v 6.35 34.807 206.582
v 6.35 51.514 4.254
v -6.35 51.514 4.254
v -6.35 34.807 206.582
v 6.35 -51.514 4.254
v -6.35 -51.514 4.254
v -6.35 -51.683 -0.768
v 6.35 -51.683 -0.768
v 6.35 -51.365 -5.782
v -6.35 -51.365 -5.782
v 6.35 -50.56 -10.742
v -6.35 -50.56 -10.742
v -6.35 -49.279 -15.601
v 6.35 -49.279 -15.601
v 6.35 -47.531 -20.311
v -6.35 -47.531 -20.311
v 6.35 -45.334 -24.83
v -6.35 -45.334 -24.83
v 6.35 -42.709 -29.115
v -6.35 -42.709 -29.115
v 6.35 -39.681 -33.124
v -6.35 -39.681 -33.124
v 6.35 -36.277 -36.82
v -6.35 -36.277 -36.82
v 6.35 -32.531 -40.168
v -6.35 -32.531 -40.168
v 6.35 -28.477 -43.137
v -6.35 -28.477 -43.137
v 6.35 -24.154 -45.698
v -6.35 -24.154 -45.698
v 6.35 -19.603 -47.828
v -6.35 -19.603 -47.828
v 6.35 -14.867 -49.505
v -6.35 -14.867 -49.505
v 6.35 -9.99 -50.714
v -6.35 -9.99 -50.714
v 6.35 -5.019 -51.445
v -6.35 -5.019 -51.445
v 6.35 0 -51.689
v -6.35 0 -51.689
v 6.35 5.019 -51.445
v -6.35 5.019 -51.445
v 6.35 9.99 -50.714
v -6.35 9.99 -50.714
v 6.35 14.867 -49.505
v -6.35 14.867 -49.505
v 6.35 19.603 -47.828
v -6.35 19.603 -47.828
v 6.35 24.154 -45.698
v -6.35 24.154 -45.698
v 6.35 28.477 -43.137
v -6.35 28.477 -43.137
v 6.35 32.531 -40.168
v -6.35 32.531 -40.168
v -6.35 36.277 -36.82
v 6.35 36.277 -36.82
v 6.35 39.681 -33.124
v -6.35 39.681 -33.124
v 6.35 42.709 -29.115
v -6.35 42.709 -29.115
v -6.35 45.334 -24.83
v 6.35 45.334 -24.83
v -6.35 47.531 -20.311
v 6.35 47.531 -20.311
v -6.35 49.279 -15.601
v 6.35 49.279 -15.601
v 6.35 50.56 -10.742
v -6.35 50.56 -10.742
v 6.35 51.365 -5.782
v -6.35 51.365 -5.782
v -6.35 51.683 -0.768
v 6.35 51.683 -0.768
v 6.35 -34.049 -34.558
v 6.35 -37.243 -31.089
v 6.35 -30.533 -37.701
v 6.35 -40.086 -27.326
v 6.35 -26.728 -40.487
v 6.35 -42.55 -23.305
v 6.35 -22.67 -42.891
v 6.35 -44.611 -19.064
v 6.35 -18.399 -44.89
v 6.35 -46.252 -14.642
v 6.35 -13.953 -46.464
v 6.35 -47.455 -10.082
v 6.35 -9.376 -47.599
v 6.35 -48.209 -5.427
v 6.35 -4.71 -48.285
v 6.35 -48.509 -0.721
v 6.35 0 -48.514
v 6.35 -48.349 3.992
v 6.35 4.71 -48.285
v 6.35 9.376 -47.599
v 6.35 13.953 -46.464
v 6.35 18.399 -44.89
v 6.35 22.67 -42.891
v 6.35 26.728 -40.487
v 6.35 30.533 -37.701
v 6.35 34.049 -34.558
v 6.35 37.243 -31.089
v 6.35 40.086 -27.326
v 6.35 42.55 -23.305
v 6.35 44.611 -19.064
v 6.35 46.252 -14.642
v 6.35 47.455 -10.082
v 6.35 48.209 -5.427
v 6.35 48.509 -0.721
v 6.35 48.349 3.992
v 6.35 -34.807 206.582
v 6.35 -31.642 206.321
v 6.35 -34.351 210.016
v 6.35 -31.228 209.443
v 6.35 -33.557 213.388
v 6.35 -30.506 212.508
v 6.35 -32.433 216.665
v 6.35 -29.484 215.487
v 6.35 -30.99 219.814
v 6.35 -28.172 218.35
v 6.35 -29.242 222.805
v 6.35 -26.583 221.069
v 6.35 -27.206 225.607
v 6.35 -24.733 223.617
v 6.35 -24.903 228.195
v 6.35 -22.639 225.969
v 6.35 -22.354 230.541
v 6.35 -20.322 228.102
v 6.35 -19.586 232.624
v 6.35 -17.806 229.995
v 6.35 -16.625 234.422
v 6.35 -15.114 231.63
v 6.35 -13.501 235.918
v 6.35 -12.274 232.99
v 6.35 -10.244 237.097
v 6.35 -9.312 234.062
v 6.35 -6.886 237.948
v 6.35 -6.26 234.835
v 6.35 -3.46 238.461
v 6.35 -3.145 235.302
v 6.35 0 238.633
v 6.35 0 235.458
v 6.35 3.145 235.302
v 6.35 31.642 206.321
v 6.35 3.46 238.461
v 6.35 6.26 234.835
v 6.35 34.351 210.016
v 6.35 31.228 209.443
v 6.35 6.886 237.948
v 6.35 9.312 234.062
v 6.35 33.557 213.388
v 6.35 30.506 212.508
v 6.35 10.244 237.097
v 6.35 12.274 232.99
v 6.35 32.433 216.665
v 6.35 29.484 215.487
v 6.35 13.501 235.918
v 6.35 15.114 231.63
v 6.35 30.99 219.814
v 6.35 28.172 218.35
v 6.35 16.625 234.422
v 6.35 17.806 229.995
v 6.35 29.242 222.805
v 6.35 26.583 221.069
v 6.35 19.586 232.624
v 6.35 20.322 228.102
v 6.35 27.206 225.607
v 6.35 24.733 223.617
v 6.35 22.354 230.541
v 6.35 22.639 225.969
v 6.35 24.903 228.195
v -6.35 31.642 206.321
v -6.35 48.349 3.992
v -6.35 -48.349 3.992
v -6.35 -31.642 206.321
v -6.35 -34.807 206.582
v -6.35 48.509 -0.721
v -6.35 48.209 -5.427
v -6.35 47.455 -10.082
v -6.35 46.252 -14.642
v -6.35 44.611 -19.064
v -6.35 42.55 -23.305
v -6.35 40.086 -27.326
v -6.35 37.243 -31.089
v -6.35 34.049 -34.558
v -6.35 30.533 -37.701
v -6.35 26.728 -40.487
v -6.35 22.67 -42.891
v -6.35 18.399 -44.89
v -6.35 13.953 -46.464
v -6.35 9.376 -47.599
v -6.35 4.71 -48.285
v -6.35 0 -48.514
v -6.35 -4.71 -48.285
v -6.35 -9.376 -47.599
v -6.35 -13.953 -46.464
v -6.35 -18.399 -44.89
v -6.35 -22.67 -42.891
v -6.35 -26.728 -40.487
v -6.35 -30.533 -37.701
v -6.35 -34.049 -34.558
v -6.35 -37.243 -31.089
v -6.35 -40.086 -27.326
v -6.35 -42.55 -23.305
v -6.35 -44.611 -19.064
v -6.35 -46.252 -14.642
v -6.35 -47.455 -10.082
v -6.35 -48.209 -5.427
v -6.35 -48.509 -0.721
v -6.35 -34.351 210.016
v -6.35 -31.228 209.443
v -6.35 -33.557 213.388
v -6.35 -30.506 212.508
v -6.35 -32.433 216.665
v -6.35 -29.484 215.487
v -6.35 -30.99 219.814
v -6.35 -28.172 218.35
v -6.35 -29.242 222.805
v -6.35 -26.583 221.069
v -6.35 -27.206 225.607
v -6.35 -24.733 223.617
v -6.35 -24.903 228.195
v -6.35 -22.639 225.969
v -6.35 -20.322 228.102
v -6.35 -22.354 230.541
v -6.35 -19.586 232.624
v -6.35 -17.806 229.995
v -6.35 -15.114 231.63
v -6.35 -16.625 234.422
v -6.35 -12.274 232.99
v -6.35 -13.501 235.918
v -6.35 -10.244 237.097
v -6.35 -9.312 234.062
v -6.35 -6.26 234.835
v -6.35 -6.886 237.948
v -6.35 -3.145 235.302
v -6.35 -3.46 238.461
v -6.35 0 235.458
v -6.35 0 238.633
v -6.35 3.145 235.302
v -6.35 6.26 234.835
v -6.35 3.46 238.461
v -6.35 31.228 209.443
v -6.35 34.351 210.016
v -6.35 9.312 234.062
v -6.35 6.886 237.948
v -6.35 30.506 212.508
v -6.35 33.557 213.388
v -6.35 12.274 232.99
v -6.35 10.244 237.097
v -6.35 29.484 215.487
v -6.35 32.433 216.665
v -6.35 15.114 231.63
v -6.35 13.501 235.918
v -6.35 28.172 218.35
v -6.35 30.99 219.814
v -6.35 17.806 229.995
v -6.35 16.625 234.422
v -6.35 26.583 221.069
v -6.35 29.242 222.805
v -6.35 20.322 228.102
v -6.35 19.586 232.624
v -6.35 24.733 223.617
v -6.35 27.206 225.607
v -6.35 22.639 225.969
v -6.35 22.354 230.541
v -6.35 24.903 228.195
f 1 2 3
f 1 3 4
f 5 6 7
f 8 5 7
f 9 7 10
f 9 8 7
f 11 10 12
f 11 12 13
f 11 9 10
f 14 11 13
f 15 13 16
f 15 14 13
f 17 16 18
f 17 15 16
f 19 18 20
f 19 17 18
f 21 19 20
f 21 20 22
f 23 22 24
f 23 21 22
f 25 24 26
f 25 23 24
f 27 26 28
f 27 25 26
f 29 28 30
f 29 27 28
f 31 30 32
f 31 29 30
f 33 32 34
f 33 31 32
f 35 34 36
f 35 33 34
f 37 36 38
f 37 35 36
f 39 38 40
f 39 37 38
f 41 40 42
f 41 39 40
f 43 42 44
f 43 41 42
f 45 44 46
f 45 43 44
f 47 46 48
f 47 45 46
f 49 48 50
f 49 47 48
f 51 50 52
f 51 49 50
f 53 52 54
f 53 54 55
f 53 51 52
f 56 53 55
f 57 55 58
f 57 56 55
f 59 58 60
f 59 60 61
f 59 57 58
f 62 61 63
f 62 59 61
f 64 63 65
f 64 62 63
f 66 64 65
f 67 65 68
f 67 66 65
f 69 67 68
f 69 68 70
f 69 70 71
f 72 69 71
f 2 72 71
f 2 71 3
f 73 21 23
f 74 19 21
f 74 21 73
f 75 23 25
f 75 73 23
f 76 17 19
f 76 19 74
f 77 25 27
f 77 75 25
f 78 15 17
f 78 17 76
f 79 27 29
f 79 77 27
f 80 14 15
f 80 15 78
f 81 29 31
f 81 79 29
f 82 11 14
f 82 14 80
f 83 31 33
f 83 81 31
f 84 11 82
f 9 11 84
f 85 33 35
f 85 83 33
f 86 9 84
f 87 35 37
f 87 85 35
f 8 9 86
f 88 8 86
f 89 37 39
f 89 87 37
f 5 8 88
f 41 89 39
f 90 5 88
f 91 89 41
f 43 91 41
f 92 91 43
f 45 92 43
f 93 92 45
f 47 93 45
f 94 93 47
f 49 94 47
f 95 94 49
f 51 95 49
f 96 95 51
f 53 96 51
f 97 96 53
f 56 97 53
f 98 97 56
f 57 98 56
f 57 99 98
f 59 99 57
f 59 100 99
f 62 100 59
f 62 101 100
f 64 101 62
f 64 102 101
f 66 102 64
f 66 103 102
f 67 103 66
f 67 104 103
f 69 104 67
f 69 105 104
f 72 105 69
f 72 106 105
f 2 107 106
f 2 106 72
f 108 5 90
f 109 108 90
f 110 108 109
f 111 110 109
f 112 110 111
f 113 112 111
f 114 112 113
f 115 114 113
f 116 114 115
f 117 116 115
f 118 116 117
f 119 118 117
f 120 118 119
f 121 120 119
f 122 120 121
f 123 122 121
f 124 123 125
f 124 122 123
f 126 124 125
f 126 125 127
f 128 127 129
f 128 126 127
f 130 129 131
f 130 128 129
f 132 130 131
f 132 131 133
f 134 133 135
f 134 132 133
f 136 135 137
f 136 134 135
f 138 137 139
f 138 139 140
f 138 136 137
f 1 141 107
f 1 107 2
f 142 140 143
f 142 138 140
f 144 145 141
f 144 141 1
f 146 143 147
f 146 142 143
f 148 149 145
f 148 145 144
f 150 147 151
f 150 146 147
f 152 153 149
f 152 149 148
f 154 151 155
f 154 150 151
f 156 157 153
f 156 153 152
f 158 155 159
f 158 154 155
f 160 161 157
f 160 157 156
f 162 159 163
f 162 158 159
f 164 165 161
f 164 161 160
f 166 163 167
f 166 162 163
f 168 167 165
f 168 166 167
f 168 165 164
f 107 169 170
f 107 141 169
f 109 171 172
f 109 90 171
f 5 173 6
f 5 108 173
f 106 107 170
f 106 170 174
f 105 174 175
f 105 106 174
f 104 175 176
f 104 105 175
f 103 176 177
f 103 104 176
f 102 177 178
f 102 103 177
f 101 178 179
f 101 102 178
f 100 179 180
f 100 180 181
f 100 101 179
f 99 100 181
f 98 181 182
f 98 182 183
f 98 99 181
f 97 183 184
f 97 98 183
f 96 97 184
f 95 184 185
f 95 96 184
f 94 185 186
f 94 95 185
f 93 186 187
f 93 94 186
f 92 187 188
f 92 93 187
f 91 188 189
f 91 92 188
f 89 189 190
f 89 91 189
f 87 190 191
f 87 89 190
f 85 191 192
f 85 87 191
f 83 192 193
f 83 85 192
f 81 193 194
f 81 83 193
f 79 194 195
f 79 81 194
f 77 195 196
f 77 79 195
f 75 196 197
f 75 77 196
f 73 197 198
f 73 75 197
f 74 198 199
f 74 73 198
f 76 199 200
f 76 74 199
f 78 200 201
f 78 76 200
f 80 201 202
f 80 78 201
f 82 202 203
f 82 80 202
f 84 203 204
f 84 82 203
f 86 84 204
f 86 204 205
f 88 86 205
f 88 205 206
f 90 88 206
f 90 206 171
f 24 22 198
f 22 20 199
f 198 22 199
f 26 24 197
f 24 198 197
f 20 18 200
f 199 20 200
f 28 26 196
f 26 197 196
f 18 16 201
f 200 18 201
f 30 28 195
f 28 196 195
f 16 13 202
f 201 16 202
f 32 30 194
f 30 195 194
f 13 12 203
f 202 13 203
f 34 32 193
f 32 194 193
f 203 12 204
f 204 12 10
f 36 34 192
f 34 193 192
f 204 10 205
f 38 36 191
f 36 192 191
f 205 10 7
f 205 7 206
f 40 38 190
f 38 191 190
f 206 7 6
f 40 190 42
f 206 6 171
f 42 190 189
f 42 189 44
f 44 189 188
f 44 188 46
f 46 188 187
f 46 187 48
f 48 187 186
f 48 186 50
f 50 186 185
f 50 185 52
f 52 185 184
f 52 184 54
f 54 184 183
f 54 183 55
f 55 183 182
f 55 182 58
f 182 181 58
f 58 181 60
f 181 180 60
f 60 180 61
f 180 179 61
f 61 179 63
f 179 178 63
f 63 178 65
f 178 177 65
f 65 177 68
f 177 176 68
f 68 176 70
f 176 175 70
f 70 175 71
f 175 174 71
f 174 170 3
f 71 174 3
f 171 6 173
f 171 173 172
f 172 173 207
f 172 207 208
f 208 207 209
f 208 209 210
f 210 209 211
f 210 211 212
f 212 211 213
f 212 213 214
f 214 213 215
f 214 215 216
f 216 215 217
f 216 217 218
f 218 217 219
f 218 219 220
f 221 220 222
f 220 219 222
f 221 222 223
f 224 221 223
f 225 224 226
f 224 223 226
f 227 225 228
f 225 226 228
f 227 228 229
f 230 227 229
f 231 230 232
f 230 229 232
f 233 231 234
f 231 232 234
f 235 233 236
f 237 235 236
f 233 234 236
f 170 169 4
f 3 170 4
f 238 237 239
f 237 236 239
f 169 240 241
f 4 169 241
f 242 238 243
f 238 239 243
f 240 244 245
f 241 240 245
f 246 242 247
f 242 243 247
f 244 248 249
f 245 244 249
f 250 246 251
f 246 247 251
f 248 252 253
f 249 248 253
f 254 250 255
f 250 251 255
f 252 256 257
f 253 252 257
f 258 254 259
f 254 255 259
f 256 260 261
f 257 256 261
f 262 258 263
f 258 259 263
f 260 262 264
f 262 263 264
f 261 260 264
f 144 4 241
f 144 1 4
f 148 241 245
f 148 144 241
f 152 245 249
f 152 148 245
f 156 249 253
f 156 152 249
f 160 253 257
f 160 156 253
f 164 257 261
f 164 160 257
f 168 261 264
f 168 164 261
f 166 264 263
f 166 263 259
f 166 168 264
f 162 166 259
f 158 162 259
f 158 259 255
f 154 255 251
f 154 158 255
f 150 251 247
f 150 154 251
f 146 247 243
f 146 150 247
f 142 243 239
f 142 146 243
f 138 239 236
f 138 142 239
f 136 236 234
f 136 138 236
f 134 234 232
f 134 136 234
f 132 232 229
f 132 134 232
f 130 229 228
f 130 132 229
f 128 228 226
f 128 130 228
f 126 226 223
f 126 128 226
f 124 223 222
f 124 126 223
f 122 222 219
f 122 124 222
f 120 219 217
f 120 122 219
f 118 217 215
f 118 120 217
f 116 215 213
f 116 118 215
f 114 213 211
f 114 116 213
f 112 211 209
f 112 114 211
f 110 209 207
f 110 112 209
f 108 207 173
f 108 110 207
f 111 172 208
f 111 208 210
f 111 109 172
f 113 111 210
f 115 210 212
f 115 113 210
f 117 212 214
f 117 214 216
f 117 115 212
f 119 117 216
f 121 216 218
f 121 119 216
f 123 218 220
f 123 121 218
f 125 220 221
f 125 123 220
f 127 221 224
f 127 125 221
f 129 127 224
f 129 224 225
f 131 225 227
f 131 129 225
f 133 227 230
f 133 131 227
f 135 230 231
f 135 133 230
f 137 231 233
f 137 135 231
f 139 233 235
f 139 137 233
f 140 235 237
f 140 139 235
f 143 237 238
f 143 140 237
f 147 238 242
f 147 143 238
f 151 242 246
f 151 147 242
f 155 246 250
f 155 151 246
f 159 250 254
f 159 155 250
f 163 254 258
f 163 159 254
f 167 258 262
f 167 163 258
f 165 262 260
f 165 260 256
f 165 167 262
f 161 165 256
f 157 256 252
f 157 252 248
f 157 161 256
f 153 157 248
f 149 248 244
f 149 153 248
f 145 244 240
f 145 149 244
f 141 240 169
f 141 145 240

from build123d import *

# Parameters (mm, degrees)
F1_DEPTH = 6.35


with BuildPart() as f1:
    # F0 (on Right) → F1 (new body, symmetric)
    with BuildSketch(Plane.YZ):
        with BuildLine():
            Line((-34.806537, 206.582127), (-51.513675, 4.253708))
            ThreePointArc((-51.513675, 4.253708), (0, -51.689), (51.513675, 4.253708))
            Line((51.513675, 4.253708), (34.806537, 206.582127))
            ThreePointArc((34.806537, 206.582127), (0, 238.633), (-34.806537, 206.582127))
        make_face()
        with BuildLine():
            ThreePointArc((48.349444, 3.992424), (0, -48.514), (-48.349444, 3.992424))
            Line((-48.349444, 3.992424), (-31.642306, 206.320843))
            ThreePointArc((-31.642306, 206.320843), (0, 235.458), (31.642306, 206.320843))
            Line((31.642306, 206.320843), (48.349444, 3.992424))
        make_face(mode=Mode.SUBTRACT)
    extrude(amount=F1_DEPTH, both=True)


solid = f1.part
